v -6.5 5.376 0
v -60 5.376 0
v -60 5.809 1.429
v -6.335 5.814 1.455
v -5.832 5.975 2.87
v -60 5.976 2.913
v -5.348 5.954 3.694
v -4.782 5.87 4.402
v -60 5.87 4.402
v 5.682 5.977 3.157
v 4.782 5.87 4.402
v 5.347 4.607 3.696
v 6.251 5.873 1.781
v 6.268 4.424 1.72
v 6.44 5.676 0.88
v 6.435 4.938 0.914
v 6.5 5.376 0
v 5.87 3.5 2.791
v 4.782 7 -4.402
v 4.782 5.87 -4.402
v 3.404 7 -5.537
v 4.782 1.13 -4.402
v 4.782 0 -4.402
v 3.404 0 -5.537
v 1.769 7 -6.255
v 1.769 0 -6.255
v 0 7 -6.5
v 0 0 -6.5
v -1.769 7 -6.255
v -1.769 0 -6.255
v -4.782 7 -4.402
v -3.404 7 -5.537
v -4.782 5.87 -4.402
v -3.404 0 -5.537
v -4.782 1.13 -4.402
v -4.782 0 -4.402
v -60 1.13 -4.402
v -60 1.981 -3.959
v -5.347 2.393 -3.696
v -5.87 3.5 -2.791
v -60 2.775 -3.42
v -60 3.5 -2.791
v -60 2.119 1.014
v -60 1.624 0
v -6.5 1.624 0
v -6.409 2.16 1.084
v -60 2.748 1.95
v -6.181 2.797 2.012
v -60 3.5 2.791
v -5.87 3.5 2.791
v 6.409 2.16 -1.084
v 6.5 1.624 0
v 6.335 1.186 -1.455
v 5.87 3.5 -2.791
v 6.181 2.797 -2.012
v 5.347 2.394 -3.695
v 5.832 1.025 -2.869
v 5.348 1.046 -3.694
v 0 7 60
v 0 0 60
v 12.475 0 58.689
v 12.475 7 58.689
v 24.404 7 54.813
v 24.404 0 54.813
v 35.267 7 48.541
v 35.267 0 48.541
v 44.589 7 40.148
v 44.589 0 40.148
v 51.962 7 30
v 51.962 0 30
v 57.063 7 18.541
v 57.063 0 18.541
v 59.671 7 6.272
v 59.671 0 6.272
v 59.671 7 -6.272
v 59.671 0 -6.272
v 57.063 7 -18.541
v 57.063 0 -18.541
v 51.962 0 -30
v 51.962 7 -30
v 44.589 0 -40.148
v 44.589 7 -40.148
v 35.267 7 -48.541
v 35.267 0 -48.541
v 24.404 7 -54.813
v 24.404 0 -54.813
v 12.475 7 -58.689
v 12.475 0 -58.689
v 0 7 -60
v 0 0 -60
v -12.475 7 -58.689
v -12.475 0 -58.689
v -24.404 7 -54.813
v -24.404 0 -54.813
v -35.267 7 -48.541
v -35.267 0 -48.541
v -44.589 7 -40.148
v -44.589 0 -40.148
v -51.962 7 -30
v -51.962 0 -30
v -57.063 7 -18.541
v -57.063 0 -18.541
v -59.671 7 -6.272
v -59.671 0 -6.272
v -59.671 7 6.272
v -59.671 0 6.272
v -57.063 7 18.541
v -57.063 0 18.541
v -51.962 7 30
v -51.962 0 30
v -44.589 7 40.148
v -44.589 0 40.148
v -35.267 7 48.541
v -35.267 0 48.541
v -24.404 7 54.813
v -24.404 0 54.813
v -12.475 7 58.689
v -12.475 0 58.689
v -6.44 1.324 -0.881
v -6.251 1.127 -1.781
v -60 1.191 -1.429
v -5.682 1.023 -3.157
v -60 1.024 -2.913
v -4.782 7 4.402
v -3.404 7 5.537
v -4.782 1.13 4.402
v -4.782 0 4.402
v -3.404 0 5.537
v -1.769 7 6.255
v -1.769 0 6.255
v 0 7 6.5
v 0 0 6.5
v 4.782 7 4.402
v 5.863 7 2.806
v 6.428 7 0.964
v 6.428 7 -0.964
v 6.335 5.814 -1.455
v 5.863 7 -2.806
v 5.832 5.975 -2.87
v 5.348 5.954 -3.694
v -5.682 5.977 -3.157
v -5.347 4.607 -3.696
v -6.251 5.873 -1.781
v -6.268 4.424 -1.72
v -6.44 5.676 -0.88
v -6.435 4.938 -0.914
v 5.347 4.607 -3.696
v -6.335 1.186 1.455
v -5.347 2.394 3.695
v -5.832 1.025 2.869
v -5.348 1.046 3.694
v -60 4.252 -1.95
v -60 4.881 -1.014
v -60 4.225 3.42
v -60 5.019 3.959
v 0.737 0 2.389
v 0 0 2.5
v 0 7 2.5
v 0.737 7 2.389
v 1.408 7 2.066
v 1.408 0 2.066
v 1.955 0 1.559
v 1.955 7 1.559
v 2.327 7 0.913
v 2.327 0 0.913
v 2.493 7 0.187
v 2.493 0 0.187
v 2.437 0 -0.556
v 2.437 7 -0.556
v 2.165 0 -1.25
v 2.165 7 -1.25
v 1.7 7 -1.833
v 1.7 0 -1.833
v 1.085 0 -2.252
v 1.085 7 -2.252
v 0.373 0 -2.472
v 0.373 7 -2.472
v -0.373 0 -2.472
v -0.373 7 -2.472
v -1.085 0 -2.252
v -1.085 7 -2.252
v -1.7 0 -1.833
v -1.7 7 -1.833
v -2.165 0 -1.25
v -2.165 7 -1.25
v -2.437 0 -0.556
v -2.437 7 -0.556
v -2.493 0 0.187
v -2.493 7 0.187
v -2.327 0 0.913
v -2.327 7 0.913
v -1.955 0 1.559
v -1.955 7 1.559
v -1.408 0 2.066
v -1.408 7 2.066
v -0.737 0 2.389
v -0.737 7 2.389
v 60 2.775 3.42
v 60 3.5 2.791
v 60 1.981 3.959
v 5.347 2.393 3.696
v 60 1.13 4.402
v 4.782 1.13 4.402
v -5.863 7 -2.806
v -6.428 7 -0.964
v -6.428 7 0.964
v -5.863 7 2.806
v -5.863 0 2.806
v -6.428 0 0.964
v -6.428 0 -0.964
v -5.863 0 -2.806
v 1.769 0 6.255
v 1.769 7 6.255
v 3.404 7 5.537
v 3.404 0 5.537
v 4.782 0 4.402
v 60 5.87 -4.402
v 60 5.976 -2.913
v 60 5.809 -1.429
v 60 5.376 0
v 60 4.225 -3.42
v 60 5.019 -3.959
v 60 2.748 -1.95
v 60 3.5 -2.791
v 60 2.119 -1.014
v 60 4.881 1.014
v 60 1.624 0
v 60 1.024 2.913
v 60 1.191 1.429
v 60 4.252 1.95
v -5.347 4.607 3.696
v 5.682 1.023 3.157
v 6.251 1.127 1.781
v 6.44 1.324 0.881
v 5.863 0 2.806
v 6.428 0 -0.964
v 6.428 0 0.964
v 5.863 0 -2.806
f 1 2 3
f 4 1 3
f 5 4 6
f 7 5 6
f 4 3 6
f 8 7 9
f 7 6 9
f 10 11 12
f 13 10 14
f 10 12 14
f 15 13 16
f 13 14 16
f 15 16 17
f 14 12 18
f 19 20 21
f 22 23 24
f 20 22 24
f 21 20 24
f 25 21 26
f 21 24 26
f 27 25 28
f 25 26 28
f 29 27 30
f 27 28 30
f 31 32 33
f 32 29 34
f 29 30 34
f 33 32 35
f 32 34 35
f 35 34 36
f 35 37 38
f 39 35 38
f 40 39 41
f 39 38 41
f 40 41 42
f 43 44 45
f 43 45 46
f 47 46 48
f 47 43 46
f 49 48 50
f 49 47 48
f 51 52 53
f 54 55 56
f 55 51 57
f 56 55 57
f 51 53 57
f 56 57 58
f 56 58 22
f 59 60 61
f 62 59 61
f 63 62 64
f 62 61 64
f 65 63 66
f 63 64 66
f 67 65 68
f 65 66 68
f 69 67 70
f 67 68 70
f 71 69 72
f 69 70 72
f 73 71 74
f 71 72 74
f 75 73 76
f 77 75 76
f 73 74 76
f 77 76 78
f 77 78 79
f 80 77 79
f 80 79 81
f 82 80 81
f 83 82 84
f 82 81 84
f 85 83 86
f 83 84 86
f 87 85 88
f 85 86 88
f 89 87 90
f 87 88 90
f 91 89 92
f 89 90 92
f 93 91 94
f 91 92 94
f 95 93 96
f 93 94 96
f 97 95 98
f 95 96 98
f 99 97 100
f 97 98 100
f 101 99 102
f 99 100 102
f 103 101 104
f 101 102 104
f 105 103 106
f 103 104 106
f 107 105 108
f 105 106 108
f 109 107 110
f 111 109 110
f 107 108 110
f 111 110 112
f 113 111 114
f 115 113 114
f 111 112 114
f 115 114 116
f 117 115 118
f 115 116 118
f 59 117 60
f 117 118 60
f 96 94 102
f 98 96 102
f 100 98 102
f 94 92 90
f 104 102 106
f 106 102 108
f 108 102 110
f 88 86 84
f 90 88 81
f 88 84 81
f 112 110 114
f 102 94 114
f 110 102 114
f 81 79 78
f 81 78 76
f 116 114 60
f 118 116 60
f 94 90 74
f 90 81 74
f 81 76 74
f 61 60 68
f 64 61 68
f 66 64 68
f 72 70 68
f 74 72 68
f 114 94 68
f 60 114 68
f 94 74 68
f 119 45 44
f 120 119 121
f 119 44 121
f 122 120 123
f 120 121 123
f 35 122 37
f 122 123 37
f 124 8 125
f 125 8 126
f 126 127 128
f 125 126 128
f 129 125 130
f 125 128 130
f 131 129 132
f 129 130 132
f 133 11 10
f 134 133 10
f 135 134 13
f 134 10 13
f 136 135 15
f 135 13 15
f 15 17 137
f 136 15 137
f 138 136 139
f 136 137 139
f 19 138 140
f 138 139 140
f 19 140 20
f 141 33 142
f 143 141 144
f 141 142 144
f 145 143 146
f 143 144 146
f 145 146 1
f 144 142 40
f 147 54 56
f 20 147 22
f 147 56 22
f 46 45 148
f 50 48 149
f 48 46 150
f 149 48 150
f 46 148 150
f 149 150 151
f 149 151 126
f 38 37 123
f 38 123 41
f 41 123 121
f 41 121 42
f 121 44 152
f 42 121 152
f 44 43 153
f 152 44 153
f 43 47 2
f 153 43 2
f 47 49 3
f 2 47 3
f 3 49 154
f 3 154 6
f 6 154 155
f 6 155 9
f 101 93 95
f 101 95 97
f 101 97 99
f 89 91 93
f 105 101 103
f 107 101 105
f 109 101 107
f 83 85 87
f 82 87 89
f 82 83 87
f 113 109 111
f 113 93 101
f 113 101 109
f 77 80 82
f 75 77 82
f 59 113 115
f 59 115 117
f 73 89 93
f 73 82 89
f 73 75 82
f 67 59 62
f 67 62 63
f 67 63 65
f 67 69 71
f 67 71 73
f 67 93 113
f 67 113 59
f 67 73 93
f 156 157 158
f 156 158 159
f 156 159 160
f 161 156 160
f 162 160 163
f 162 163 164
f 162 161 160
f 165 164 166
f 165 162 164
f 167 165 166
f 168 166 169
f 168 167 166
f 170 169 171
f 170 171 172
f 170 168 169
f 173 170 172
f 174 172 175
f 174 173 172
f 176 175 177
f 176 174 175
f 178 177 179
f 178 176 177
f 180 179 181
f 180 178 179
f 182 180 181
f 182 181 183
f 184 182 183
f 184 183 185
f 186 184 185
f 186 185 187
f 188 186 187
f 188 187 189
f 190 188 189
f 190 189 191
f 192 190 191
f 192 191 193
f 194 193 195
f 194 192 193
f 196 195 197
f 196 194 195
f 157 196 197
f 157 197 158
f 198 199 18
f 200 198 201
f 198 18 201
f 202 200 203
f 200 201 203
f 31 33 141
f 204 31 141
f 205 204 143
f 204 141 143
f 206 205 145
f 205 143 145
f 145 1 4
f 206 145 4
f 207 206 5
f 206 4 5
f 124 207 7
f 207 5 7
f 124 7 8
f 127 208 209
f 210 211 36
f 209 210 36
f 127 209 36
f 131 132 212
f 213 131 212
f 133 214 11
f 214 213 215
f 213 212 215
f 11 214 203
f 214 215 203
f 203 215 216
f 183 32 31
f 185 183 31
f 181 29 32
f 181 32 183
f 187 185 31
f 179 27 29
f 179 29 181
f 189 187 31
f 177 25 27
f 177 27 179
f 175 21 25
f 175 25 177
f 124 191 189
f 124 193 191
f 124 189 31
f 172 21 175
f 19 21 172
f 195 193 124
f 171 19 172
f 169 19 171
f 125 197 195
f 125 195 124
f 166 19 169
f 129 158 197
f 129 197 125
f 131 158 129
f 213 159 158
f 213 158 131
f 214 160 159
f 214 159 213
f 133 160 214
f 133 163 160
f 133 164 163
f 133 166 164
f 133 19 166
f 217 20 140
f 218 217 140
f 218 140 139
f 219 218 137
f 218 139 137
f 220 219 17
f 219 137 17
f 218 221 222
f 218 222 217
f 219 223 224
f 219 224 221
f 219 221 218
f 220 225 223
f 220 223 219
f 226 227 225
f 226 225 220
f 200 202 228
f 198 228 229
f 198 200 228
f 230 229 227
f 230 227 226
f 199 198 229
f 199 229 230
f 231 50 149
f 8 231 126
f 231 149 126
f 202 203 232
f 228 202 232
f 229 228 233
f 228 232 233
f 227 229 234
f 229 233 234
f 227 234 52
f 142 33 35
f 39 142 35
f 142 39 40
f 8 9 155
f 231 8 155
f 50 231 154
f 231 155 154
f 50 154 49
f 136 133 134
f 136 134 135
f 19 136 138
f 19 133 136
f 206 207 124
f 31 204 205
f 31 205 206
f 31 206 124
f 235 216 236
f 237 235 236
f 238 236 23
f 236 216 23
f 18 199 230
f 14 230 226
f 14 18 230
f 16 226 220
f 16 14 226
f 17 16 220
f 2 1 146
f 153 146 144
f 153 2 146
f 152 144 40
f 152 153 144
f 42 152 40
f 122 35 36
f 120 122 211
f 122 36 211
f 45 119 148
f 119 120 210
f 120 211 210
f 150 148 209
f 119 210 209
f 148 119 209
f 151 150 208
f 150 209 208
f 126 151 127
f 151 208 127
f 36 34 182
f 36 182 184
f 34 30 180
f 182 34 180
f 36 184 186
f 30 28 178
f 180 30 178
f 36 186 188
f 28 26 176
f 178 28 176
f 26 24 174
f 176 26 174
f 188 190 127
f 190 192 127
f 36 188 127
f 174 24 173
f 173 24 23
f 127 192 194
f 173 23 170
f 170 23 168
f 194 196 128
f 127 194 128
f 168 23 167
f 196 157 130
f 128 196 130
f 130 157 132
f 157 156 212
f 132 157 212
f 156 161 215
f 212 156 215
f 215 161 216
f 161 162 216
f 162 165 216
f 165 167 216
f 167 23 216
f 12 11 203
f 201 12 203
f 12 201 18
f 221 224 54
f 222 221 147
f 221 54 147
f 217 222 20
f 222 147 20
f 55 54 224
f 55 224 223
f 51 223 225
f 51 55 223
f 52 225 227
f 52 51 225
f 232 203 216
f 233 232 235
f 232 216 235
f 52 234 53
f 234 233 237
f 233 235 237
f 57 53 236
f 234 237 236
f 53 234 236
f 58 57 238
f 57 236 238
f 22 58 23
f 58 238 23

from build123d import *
from build123d.topology import SkipClean

# Parameters (mm, degrees)
SKETCH1_R               = 6.5
SKETCH1_R_2             = 2.5
BOSS_EXTRUDE1_DEPTH     = 7
BOSS_EXTRUDE2_START     = 4
BOSS_EXTRUDE2_DEPTH     = 56
CIRPATTERN1_COUNT       = 2
BODY_MOVE_COPY1_START   = -60
BODY_MOVE_COPY1_DEPTH   = 55.217817956
BODY_MOVE_COPY1_START_2 = 4.782182044
BODY_MOVE_COPY1_2_DEPTH = 55.217817956
BODY_MOVE_COPY1_3_DEPTH = 55.217817956
BODY_MOVE_COPY1_4_DEPTH = 55.217817956
BODY_MOVE_COPY1_START_3 = -1e-07
BODY_MOVE_COPY1_5_DEPTH = 7.0000002
SKETCH4_R               = 60
BOSS_EXTRUDE4_DEPTH     = 7


with BuildPart() as part:
    # Sketch1 → Boss-Extrude1 (new body)
    with BuildSketch(Plane(origin=(0, 0, 0), x_dir=(1, 0, 0), z_dir=(0, 1, 0))):
        with Locations(Location((0, 0, 0), (0, 0, 270))):
            Circle(SKETCH1_R)
        with Locations(Location((0, 0, 0), (0, 0, 270))):
            Circle(SKETCH1_R_2, mode=Mode.SUBTRACT)
    extrude(amount=BOSS_EXTRUDE1_DEPTH)

    # Sketch2 → Boss-Extrude2 (add)
    with BuildSketch(Plane(origin=(0, 0, 0), x_dir=(0, 0, -1), z_dir=(1, 0, 0)).offset(BOSS_EXTRUDE2_START)):
        with BuildLine():
            ThreePointArc((-4.4023555, 5.870499115), (0.805969699, 4.99680087), (4.4023555, 1.129500885))
            Line((4.4023555, 1.129500885), (-4.4023555, 5.870499115))
        make_face()
        with BuildLine():
            Line((-4.4023555, 5.870499115), (4.4023555, 1.129500885))
            ThreePointArc((4.4023555, 1.129500885), (-0.805969699, 2.00319913), (-4.4023555, 5.870499115))
        make_face()
    boss_extrude2 = extrude(amount=BOSS_EXTRUDE2_DEPTH)

    # CirPattern1: Boss-Extrude2 ×2 about axis
    cirpattern1_axis = Axis((0, 7.76683161, 0), (0, -1, 0))
    for i in range(1, CIRPATTERN1_COUNT):
        add(boss_extrude2.rotate(cirpattern1_axis, i * 360 / CIRPATTERN1_COUNT))

    # Body-Move/Copy1: read off the stored shape, not the designer's step
    # Body-Move/Copy1 outline → Body-Move/Copy1 (cut)
    with BuildSketch(Plane.YZ.offset(BODY_MOVE_COPY1_START)):
        with BuildLine():
            ThreePointArc((3.5, 2.791065672), (2.385672983, 3.701050486), (1.129500885, 4.4023555))
            ThreePointArc((1.129500885, 4.4023555), (1.074002125, 2.16715462), (1.624132962, 0))
            ThreePointArc((1.624132962, 0), (2.417503652, 1.492693089), (3.5, 2.791065672))
        make_face()
        with BuildLine():
            ThreePointArc((5.870499115, -4.4023555), (5.925997875, -2.16715462), (5.375867038, 0))
            ThreePointArc((5.375867038, 0), (4.582496348, -1.492693089), (3.5, -2.791065672))
            ThreePointArc((3.5, -2.791065672), (4.614327017, -3.701050486), (5.870499115, -4.4023555))
        make_face()
    extrude(amount=BODY_MOVE_COPY1_DEPTH, mode=Mode.SUBTRACT)

    # Body-Move_Copy1 2 outline → Body-Move_Copy1 2 (cut)
    with BuildSketch(Plane.YZ.offset(BODY_MOVE_COPY1_START_2)):
        with BuildLine():
            ThreePointArc((5.870499115, 4.4023555), (4.614327017, 3.701050486), (3.5, 2.791065672))
            ThreePointArc((3.5, 2.791065672), (4.582496348, 1.492693089), (5.375867038, 0))
            ThreePointArc((5.375867038, 0), (5.925997875, 2.16715462), (5.870499115, 4.4023555))
        make_face()
        with BuildLine():
            ThreePointArc((3.5, -2.791065672), (2.417503652, -1.492693089), (1.624132962, 0))
            ThreePointArc((1.624132962, 0), (1.074002125, -2.16715462), (1.129500885, -4.4023555))
            ThreePointArc((1.129500885, -4.4023555), (2.385672983, -3.701050486), (3.5, -2.791065672))
        make_face()
    extrude(amount=BODY_MOVE_COPY1_2_DEPTH, mode=Mode.SUBTRACT)

    # Body-Move_Copy1 3 outline → Body-Move_Copy1 3 (add)
    with BuildSketch(Plane.YZ.offset(BODY_MOVE_COPY1_START)):
        with BuildLine():
            ThreePointArc((5.870499115, 4.4023555), (4.614327017, 3.701050486), (3.5, 2.791065672))
            ThreePointArc((3.5, 2.791065672), (4.582496348, 1.492693089), (5.375867038, 0))
            ThreePointArc((5.375867038, 0), (5.925997875, 2.16715462), (5.870499115, 4.4023555))
        make_face()
        with BuildLine():
            ThreePointArc((3.5, -2.791065672), (2.417503652, -1.492693089), (1.624132962, 0))
            ThreePointArc((1.624132962, 0), (1.074002125, -2.16715462), (1.129500885, -4.4023555))
            ThreePointArc((1.129500885, -4.4023555), (2.385672983, -3.701050486), (3.5, -2.791065672))
        make_face()
    extrude(amount=BODY_MOVE_COPY1_3_DEPTH)

    # Body-Move_Copy1 4 outline → Body-Move_Copy1 4 (add)
    with BuildSketch(Plane.YZ.offset(BODY_MOVE_COPY1_START_2)):
        with BuildLine():
            ThreePointArc((3.5, 2.791065672), (2.385672983, 3.701050486), (1.129500885, 4.4023555))
            ThreePointArc((1.129500885, 4.4023555), (1.074002125, 2.16715462), (1.624132962, 0))
            ThreePointArc((1.624132962, 0), (2.417503652, 1.492693089), (3.5, 2.791065672))
        make_face()
        with BuildLine():
            ThreePointArc((5.870499115, -4.4023555), (5.925997875, -2.16715462), (5.375867038, 0))
            ThreePointArc((5.375867038, 0), (4.582496348, -1.492693089), (3.5, -2.791065672))
            ThreePointArc((3.5, -2.791065672), (4.614327017, -3.701050486), (5.870499115, -4.4023555))
        make_face()
    extrude(amount=BODY_MOVE_COPY1_4_DEPTH)

    # Body-Move_Copy1 5 outline → Body-Move_Copy1 5 (add)
    with SkipClean():  # the faces are left unmerged after this step: merging them gives an invalid solid
        with BuildSketch(Plane(origin=(0, 0, 0), x_dir=(1, 0, 0), z_dir=(0, 1, 0)).offset(BODY_MOVE_COPY1_START_3)):
            with BuildLine():
                ThreePointArc((4.782182098, -4.402355549), (6.5, 0), (4.782182098, 4.402355549))
                Line((4.782182098, 4.402355549), (4.782182098, -4.402355549))
            make_face()
            with BuildLine():
                Line((-4.782182098, -4.402355549), (-4.782182098, 4.402355549))
                ThreePointArc((-4.782182098, 4.402355549), (-6.5, 0), (-4.782182098, -4.402355549))
            make_face()
        extrude(amount=BODY_MOVE_COPY1_5_DEPTH)


with BuildPart() as body_2:
    # Sketch4 → Boss-Extrude4 (new body)
    with BuildSketch(Plane(origin=(0, 0, 0), x_dir=(1, 0, 0), z_dir=(0, 1, 0))):
        with Locations(Location((0, 0, 0), (0, 0, 270))):
            Circle(SKETCH4_R)
    extrude(amount=BOSS_EXTRUDE4_DEPTH)


solid = Compound([part.part, body_2.part])
